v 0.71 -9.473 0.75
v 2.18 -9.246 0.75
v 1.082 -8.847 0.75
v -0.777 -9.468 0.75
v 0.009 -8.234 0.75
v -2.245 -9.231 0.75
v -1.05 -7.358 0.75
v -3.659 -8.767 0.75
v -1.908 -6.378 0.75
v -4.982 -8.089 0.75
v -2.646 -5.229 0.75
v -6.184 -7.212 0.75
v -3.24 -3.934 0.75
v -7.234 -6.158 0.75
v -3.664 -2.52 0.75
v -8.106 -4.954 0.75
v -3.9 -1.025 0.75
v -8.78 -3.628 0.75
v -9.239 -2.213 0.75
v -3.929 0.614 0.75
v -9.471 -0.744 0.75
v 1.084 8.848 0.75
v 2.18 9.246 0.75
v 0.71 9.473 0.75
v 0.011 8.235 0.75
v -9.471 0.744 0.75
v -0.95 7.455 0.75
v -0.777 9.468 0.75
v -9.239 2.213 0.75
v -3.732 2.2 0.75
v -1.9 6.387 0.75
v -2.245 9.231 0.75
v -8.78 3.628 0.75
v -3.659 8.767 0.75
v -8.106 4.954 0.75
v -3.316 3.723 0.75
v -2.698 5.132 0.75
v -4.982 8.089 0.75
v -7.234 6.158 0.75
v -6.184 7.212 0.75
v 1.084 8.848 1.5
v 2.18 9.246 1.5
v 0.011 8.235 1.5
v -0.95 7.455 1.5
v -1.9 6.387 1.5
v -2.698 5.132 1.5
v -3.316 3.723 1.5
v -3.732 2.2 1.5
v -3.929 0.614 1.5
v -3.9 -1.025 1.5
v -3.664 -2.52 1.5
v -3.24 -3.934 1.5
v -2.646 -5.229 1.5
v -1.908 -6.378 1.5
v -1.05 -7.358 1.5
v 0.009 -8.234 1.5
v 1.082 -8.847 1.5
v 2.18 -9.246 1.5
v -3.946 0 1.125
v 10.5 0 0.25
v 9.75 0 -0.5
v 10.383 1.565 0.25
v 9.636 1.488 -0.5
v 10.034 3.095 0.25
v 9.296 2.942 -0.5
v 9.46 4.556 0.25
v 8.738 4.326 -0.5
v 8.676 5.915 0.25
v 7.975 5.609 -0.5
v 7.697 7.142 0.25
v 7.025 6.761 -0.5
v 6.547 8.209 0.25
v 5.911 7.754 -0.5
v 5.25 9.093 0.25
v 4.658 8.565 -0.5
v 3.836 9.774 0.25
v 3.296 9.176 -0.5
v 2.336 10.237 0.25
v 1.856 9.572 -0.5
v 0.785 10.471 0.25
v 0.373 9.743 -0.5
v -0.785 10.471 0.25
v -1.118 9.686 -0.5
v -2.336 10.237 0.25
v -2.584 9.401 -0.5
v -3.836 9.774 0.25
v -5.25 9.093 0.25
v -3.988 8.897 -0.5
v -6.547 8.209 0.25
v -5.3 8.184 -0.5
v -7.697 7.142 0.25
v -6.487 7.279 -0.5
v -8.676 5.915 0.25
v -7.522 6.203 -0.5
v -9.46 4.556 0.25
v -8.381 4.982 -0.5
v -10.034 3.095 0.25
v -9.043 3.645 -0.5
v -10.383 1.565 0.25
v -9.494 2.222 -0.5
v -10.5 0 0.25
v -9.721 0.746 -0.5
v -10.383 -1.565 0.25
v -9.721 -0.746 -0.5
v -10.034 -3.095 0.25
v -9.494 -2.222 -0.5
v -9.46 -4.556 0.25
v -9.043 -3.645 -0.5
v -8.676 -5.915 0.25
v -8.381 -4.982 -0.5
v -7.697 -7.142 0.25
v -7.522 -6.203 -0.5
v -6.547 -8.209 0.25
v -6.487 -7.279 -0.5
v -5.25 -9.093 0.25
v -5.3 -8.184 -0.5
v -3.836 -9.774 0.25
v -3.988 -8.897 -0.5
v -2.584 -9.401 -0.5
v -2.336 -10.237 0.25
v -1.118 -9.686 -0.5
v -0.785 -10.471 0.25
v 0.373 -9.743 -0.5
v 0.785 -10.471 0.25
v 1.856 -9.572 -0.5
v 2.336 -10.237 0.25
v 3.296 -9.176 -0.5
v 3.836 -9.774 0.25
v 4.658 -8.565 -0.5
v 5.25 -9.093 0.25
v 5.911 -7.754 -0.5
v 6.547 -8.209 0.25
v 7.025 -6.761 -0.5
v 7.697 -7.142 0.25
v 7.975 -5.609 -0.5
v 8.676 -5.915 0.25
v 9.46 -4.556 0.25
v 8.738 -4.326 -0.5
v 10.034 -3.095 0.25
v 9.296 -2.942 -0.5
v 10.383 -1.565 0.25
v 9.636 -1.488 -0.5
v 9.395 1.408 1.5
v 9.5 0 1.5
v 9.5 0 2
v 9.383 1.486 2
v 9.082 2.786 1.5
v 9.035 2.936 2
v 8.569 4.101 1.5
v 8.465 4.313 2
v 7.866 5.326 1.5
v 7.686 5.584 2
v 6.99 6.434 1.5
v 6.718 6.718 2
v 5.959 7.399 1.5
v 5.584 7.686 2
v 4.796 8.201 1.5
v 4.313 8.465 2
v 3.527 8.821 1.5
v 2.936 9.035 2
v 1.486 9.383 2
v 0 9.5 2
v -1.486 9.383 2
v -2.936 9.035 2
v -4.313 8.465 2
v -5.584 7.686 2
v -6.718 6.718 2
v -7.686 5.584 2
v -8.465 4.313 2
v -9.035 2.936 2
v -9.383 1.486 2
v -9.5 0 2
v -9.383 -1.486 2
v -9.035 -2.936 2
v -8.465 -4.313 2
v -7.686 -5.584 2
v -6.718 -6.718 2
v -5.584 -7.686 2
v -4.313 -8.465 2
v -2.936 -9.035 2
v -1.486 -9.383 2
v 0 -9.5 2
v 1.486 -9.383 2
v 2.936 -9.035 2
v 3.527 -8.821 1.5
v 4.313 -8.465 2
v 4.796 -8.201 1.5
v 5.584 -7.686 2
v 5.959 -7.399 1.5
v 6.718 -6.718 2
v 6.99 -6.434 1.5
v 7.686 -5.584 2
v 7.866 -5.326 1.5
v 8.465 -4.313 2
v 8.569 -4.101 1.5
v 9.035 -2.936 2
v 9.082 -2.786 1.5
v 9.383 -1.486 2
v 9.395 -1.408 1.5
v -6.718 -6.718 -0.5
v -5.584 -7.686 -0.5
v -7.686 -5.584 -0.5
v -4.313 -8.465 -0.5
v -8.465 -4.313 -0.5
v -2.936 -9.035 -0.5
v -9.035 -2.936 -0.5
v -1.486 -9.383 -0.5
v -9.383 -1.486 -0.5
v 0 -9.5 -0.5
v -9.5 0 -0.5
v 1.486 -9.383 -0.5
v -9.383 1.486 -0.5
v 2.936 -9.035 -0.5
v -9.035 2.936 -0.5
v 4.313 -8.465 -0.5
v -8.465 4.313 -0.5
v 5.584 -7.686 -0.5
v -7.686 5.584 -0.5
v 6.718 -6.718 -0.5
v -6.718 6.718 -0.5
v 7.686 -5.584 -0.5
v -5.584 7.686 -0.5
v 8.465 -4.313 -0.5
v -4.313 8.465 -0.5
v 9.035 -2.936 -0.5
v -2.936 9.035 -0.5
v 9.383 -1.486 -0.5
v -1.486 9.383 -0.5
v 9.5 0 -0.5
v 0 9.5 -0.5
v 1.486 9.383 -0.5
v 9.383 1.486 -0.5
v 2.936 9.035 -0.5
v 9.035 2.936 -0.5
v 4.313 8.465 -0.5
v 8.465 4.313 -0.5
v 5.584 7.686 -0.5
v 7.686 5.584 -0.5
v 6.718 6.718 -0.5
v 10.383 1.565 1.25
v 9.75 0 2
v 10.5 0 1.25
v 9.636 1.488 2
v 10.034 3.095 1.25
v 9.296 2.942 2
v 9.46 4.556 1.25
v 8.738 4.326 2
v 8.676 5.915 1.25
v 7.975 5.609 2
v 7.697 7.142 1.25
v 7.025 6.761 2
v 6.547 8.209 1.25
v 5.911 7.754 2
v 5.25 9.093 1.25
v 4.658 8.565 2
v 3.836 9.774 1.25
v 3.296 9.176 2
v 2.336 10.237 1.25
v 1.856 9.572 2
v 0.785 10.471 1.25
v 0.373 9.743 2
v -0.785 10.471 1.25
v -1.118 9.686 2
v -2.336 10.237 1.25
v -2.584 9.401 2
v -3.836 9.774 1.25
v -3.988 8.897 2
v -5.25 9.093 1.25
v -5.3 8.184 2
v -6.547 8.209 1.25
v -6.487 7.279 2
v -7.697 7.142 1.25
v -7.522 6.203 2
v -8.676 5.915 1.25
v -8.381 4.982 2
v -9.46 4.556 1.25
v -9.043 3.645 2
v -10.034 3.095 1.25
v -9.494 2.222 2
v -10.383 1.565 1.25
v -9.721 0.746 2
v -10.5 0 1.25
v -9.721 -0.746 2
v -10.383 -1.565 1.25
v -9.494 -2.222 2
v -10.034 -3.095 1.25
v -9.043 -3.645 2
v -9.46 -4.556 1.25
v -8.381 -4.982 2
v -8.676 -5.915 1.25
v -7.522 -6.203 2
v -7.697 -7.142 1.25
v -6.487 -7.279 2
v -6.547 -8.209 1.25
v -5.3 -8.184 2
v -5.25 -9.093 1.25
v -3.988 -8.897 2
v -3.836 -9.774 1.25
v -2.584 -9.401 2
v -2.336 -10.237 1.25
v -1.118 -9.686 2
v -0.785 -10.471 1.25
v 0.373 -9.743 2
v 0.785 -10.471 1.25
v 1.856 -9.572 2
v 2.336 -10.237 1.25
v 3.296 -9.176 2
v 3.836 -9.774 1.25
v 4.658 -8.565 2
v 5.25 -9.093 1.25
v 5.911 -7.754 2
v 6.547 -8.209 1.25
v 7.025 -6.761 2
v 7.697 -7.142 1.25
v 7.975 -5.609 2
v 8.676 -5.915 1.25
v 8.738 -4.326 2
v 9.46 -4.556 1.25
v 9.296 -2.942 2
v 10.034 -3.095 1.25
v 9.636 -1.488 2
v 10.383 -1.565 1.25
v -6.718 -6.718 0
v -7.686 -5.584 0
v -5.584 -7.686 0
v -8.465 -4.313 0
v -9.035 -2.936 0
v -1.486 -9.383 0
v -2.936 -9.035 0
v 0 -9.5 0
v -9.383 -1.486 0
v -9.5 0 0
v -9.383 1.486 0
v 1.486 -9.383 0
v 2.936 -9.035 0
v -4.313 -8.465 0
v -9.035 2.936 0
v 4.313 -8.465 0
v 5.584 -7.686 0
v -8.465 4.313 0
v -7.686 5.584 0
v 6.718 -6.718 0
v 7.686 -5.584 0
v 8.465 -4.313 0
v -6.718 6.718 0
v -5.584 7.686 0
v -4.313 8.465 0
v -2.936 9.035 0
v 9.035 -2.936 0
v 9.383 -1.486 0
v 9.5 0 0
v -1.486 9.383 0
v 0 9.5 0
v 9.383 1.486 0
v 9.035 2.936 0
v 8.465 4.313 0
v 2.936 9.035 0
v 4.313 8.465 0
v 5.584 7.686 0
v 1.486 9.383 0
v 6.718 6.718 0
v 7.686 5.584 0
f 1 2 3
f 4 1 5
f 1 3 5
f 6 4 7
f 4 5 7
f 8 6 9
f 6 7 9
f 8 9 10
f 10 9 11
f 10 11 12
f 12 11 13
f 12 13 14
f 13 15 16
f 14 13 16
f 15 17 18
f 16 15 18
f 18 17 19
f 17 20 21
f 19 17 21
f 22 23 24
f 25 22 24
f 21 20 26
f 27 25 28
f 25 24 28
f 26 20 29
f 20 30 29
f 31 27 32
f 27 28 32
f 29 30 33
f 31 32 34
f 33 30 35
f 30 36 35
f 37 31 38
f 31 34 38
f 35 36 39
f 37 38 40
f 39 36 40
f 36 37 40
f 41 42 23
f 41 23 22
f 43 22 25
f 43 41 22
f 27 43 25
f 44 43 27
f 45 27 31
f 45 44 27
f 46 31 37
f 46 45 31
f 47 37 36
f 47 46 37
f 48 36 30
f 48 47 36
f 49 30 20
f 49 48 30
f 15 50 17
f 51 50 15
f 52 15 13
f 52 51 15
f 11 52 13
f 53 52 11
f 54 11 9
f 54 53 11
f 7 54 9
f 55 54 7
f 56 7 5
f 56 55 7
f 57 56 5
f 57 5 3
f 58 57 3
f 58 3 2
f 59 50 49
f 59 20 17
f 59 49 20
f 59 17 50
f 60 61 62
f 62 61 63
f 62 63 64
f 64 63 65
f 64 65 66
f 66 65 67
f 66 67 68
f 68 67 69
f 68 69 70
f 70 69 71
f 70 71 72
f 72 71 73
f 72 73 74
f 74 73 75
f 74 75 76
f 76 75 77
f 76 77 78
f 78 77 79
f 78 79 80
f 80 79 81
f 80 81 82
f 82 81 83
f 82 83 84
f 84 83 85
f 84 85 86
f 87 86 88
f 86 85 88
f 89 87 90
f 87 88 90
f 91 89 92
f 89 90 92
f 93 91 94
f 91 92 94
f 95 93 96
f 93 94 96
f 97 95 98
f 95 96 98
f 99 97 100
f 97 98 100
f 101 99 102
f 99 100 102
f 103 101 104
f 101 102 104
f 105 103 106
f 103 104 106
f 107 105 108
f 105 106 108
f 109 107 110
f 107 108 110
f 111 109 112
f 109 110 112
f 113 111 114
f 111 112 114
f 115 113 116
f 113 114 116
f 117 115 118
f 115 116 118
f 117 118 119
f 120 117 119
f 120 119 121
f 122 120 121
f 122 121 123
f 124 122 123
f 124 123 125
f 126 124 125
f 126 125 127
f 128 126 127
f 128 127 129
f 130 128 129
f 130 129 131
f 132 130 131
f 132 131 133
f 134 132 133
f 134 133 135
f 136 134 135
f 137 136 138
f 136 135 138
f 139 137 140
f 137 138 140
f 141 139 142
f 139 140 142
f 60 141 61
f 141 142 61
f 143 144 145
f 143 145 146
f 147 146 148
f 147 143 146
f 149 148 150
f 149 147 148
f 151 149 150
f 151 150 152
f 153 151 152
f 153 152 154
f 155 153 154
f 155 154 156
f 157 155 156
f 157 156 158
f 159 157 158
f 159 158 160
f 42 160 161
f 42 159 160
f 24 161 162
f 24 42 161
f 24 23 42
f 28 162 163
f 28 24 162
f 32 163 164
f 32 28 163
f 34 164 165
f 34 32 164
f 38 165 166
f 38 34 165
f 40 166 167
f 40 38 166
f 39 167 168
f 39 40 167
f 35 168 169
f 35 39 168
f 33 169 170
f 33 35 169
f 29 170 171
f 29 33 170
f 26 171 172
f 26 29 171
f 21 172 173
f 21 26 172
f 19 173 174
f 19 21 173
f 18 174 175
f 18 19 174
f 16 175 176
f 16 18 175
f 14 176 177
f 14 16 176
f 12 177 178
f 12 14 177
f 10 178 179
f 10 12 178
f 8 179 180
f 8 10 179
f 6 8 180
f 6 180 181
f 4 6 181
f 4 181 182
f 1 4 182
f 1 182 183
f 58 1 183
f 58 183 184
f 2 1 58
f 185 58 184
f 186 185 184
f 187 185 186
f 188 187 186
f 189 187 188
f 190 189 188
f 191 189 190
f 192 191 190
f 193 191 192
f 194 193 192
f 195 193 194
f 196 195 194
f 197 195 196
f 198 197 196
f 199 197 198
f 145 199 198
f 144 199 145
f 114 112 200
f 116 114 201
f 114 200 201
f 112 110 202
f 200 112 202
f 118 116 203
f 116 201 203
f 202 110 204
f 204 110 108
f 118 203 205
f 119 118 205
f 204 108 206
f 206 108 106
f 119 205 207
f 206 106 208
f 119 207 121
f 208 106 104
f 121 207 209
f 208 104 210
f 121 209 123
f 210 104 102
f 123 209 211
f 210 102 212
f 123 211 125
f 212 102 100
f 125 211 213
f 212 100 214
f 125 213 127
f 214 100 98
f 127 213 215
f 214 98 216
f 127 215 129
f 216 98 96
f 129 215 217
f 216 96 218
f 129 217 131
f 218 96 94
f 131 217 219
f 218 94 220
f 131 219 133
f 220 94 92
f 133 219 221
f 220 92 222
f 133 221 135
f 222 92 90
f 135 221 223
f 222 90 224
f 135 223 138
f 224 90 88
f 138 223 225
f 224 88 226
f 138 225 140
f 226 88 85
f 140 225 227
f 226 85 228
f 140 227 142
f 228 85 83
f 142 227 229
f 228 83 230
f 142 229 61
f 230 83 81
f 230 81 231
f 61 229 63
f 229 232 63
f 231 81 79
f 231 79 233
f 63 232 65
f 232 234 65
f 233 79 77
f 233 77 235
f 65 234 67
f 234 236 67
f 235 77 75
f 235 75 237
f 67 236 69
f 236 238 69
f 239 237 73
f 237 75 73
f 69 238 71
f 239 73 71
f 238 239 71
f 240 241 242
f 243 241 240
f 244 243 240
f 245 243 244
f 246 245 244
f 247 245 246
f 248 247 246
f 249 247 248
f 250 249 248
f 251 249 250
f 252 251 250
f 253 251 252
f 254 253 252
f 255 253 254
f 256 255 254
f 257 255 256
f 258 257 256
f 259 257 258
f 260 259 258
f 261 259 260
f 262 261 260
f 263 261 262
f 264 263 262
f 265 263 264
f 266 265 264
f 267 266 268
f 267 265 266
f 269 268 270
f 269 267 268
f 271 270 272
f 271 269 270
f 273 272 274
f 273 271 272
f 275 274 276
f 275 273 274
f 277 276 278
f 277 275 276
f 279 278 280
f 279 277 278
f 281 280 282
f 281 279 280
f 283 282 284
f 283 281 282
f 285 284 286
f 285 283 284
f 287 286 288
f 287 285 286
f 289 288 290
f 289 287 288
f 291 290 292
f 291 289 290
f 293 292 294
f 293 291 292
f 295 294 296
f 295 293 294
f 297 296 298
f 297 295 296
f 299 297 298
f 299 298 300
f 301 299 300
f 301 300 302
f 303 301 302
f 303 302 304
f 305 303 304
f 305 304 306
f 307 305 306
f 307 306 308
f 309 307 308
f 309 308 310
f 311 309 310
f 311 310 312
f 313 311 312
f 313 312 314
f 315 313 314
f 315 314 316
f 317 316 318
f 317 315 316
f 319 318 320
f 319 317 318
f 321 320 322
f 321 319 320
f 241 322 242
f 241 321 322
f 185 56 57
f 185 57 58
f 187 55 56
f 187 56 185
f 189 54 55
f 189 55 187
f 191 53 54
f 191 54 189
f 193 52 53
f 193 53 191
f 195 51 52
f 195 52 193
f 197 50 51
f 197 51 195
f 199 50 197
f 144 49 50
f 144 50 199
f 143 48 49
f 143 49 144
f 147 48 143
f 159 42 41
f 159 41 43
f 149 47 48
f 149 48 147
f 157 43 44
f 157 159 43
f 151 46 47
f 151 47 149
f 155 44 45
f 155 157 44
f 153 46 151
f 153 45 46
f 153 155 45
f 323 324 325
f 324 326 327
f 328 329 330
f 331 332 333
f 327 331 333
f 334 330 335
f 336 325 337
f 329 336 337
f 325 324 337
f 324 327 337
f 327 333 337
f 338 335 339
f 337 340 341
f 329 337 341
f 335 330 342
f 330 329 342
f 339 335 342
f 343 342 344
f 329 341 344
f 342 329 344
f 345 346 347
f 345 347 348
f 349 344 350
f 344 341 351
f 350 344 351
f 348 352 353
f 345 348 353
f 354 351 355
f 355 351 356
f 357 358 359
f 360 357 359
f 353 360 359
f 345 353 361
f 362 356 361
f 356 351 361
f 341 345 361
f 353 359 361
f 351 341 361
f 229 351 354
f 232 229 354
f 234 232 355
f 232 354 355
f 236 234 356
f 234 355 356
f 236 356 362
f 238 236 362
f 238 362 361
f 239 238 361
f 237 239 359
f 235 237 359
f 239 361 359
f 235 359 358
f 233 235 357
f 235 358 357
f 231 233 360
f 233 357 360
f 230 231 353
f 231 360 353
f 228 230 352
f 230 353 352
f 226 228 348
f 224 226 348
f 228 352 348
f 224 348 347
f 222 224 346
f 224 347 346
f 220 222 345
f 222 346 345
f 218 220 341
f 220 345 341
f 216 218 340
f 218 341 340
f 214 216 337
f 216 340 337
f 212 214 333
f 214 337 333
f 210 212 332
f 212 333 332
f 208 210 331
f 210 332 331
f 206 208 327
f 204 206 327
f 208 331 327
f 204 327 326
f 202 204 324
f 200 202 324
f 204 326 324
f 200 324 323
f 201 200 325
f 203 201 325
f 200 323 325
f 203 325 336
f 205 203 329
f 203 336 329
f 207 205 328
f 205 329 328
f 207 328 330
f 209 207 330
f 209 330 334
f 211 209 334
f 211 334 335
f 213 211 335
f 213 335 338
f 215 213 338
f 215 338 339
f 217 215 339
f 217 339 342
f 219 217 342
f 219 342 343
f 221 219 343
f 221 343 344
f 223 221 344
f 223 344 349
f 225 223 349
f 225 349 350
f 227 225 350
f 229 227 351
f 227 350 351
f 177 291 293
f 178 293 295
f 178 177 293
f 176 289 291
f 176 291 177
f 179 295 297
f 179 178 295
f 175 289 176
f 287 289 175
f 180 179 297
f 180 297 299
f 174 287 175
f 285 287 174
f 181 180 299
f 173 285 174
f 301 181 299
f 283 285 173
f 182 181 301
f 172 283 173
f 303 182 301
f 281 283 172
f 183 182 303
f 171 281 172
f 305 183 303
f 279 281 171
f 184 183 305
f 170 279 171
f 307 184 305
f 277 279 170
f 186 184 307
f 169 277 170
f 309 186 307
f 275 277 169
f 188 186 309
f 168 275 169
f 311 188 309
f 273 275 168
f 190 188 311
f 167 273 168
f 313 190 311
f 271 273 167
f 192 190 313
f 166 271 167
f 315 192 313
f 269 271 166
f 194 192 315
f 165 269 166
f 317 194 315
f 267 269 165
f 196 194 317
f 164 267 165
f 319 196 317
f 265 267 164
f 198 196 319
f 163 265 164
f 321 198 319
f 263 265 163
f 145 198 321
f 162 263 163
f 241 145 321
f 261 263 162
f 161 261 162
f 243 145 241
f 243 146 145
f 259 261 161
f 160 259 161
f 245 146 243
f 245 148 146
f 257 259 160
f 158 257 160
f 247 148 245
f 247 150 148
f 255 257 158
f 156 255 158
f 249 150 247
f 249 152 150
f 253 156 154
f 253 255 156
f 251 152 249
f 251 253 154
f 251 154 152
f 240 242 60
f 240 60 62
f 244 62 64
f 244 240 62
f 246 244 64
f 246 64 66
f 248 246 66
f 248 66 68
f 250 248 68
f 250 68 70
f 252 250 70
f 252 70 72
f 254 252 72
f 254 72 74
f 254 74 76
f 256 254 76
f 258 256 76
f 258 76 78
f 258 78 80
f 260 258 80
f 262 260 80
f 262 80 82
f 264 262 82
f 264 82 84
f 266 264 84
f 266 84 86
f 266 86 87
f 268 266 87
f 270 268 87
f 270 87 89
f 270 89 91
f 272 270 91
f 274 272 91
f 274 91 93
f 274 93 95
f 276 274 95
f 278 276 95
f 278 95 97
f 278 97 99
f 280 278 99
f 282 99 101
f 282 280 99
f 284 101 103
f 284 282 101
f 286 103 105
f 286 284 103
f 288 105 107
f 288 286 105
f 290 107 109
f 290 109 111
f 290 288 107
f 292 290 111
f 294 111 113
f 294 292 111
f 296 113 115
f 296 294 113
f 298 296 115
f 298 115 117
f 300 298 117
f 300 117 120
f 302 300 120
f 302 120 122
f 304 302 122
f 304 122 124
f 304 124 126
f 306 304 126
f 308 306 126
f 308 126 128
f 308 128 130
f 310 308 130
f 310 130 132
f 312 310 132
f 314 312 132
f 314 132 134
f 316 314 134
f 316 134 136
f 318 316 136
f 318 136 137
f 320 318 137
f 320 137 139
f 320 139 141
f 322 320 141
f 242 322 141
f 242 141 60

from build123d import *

# Parameters (mm, degrees)
F0_R          = 10
F1_DEPTH      = 1.5
F3_DEPTH      = 0.75
F4_R          = 10.5
F4_R_2        = 9.5
F5_DEPTH      = 2
F5_DEPTH_BACK = 0.5
F6_SIZE       = 0.75


# Not quite as in the source:
# - a feature of the source that left no trace in its solid (it failed there, or was rolled back) is left out


with BuildPart() as f1:
    # F0 (on Top) → F1 (new body)
    with BuildSketch(Plane.XY):
        Circle(F0_R)
    extrude(amount=F1_DEPTH)

    # F2 (on face) → F3 (cut)
    with BuildSketch(Plane.XY.offset(1.5)):
        with BuildLine():
            add(Edge.make_bspline(
                [(3.2873270655, 9.444230025), (-3.9457486769, 8.7871247234), (-3.9457486769, 0), (-3.9457486769, -8.7871247234), (3.2873270655, -9.444230025)],
                knots=[0.0748503411, 0.0748503411, 0.0748503411, 1.5707963268, 1.5707963268, 3.0667423125, 3.0667423125, 3.0667423125], degree=2, weights=[1, 0.7330690514, 1, 0.7330690514, 1]))
            ThreePointArc((3.2873270655, 9.444230025), (-10, 0), (3.2873270655, -9.444230025))
        make_face()
    extrude(amount=-F3_DEPTH, mode=Mode.SUBTRACT)

    # F4 (on Top) → F5 (join, two sides)
    with BuildSketch(Plane.XY) as f5_sk:
        Circle(F4_R)
        Circle(F4_R_2, mode=Mode.SUBTRACT)
    extrude(amount=F5_DEPTH)
    extrude(f5_sk.sketch, amount=-F5_DEPTH_BACK)

    # F6
    f6_edges = [f1.edges().sort_by_distance(p)[0] for p in [
        (-10.5, 0, 2),
        (-10.5, 0, -0.5),
    ]]
    chamfer(f6_edges, length=F6_SIZE)


solid = f1.part
